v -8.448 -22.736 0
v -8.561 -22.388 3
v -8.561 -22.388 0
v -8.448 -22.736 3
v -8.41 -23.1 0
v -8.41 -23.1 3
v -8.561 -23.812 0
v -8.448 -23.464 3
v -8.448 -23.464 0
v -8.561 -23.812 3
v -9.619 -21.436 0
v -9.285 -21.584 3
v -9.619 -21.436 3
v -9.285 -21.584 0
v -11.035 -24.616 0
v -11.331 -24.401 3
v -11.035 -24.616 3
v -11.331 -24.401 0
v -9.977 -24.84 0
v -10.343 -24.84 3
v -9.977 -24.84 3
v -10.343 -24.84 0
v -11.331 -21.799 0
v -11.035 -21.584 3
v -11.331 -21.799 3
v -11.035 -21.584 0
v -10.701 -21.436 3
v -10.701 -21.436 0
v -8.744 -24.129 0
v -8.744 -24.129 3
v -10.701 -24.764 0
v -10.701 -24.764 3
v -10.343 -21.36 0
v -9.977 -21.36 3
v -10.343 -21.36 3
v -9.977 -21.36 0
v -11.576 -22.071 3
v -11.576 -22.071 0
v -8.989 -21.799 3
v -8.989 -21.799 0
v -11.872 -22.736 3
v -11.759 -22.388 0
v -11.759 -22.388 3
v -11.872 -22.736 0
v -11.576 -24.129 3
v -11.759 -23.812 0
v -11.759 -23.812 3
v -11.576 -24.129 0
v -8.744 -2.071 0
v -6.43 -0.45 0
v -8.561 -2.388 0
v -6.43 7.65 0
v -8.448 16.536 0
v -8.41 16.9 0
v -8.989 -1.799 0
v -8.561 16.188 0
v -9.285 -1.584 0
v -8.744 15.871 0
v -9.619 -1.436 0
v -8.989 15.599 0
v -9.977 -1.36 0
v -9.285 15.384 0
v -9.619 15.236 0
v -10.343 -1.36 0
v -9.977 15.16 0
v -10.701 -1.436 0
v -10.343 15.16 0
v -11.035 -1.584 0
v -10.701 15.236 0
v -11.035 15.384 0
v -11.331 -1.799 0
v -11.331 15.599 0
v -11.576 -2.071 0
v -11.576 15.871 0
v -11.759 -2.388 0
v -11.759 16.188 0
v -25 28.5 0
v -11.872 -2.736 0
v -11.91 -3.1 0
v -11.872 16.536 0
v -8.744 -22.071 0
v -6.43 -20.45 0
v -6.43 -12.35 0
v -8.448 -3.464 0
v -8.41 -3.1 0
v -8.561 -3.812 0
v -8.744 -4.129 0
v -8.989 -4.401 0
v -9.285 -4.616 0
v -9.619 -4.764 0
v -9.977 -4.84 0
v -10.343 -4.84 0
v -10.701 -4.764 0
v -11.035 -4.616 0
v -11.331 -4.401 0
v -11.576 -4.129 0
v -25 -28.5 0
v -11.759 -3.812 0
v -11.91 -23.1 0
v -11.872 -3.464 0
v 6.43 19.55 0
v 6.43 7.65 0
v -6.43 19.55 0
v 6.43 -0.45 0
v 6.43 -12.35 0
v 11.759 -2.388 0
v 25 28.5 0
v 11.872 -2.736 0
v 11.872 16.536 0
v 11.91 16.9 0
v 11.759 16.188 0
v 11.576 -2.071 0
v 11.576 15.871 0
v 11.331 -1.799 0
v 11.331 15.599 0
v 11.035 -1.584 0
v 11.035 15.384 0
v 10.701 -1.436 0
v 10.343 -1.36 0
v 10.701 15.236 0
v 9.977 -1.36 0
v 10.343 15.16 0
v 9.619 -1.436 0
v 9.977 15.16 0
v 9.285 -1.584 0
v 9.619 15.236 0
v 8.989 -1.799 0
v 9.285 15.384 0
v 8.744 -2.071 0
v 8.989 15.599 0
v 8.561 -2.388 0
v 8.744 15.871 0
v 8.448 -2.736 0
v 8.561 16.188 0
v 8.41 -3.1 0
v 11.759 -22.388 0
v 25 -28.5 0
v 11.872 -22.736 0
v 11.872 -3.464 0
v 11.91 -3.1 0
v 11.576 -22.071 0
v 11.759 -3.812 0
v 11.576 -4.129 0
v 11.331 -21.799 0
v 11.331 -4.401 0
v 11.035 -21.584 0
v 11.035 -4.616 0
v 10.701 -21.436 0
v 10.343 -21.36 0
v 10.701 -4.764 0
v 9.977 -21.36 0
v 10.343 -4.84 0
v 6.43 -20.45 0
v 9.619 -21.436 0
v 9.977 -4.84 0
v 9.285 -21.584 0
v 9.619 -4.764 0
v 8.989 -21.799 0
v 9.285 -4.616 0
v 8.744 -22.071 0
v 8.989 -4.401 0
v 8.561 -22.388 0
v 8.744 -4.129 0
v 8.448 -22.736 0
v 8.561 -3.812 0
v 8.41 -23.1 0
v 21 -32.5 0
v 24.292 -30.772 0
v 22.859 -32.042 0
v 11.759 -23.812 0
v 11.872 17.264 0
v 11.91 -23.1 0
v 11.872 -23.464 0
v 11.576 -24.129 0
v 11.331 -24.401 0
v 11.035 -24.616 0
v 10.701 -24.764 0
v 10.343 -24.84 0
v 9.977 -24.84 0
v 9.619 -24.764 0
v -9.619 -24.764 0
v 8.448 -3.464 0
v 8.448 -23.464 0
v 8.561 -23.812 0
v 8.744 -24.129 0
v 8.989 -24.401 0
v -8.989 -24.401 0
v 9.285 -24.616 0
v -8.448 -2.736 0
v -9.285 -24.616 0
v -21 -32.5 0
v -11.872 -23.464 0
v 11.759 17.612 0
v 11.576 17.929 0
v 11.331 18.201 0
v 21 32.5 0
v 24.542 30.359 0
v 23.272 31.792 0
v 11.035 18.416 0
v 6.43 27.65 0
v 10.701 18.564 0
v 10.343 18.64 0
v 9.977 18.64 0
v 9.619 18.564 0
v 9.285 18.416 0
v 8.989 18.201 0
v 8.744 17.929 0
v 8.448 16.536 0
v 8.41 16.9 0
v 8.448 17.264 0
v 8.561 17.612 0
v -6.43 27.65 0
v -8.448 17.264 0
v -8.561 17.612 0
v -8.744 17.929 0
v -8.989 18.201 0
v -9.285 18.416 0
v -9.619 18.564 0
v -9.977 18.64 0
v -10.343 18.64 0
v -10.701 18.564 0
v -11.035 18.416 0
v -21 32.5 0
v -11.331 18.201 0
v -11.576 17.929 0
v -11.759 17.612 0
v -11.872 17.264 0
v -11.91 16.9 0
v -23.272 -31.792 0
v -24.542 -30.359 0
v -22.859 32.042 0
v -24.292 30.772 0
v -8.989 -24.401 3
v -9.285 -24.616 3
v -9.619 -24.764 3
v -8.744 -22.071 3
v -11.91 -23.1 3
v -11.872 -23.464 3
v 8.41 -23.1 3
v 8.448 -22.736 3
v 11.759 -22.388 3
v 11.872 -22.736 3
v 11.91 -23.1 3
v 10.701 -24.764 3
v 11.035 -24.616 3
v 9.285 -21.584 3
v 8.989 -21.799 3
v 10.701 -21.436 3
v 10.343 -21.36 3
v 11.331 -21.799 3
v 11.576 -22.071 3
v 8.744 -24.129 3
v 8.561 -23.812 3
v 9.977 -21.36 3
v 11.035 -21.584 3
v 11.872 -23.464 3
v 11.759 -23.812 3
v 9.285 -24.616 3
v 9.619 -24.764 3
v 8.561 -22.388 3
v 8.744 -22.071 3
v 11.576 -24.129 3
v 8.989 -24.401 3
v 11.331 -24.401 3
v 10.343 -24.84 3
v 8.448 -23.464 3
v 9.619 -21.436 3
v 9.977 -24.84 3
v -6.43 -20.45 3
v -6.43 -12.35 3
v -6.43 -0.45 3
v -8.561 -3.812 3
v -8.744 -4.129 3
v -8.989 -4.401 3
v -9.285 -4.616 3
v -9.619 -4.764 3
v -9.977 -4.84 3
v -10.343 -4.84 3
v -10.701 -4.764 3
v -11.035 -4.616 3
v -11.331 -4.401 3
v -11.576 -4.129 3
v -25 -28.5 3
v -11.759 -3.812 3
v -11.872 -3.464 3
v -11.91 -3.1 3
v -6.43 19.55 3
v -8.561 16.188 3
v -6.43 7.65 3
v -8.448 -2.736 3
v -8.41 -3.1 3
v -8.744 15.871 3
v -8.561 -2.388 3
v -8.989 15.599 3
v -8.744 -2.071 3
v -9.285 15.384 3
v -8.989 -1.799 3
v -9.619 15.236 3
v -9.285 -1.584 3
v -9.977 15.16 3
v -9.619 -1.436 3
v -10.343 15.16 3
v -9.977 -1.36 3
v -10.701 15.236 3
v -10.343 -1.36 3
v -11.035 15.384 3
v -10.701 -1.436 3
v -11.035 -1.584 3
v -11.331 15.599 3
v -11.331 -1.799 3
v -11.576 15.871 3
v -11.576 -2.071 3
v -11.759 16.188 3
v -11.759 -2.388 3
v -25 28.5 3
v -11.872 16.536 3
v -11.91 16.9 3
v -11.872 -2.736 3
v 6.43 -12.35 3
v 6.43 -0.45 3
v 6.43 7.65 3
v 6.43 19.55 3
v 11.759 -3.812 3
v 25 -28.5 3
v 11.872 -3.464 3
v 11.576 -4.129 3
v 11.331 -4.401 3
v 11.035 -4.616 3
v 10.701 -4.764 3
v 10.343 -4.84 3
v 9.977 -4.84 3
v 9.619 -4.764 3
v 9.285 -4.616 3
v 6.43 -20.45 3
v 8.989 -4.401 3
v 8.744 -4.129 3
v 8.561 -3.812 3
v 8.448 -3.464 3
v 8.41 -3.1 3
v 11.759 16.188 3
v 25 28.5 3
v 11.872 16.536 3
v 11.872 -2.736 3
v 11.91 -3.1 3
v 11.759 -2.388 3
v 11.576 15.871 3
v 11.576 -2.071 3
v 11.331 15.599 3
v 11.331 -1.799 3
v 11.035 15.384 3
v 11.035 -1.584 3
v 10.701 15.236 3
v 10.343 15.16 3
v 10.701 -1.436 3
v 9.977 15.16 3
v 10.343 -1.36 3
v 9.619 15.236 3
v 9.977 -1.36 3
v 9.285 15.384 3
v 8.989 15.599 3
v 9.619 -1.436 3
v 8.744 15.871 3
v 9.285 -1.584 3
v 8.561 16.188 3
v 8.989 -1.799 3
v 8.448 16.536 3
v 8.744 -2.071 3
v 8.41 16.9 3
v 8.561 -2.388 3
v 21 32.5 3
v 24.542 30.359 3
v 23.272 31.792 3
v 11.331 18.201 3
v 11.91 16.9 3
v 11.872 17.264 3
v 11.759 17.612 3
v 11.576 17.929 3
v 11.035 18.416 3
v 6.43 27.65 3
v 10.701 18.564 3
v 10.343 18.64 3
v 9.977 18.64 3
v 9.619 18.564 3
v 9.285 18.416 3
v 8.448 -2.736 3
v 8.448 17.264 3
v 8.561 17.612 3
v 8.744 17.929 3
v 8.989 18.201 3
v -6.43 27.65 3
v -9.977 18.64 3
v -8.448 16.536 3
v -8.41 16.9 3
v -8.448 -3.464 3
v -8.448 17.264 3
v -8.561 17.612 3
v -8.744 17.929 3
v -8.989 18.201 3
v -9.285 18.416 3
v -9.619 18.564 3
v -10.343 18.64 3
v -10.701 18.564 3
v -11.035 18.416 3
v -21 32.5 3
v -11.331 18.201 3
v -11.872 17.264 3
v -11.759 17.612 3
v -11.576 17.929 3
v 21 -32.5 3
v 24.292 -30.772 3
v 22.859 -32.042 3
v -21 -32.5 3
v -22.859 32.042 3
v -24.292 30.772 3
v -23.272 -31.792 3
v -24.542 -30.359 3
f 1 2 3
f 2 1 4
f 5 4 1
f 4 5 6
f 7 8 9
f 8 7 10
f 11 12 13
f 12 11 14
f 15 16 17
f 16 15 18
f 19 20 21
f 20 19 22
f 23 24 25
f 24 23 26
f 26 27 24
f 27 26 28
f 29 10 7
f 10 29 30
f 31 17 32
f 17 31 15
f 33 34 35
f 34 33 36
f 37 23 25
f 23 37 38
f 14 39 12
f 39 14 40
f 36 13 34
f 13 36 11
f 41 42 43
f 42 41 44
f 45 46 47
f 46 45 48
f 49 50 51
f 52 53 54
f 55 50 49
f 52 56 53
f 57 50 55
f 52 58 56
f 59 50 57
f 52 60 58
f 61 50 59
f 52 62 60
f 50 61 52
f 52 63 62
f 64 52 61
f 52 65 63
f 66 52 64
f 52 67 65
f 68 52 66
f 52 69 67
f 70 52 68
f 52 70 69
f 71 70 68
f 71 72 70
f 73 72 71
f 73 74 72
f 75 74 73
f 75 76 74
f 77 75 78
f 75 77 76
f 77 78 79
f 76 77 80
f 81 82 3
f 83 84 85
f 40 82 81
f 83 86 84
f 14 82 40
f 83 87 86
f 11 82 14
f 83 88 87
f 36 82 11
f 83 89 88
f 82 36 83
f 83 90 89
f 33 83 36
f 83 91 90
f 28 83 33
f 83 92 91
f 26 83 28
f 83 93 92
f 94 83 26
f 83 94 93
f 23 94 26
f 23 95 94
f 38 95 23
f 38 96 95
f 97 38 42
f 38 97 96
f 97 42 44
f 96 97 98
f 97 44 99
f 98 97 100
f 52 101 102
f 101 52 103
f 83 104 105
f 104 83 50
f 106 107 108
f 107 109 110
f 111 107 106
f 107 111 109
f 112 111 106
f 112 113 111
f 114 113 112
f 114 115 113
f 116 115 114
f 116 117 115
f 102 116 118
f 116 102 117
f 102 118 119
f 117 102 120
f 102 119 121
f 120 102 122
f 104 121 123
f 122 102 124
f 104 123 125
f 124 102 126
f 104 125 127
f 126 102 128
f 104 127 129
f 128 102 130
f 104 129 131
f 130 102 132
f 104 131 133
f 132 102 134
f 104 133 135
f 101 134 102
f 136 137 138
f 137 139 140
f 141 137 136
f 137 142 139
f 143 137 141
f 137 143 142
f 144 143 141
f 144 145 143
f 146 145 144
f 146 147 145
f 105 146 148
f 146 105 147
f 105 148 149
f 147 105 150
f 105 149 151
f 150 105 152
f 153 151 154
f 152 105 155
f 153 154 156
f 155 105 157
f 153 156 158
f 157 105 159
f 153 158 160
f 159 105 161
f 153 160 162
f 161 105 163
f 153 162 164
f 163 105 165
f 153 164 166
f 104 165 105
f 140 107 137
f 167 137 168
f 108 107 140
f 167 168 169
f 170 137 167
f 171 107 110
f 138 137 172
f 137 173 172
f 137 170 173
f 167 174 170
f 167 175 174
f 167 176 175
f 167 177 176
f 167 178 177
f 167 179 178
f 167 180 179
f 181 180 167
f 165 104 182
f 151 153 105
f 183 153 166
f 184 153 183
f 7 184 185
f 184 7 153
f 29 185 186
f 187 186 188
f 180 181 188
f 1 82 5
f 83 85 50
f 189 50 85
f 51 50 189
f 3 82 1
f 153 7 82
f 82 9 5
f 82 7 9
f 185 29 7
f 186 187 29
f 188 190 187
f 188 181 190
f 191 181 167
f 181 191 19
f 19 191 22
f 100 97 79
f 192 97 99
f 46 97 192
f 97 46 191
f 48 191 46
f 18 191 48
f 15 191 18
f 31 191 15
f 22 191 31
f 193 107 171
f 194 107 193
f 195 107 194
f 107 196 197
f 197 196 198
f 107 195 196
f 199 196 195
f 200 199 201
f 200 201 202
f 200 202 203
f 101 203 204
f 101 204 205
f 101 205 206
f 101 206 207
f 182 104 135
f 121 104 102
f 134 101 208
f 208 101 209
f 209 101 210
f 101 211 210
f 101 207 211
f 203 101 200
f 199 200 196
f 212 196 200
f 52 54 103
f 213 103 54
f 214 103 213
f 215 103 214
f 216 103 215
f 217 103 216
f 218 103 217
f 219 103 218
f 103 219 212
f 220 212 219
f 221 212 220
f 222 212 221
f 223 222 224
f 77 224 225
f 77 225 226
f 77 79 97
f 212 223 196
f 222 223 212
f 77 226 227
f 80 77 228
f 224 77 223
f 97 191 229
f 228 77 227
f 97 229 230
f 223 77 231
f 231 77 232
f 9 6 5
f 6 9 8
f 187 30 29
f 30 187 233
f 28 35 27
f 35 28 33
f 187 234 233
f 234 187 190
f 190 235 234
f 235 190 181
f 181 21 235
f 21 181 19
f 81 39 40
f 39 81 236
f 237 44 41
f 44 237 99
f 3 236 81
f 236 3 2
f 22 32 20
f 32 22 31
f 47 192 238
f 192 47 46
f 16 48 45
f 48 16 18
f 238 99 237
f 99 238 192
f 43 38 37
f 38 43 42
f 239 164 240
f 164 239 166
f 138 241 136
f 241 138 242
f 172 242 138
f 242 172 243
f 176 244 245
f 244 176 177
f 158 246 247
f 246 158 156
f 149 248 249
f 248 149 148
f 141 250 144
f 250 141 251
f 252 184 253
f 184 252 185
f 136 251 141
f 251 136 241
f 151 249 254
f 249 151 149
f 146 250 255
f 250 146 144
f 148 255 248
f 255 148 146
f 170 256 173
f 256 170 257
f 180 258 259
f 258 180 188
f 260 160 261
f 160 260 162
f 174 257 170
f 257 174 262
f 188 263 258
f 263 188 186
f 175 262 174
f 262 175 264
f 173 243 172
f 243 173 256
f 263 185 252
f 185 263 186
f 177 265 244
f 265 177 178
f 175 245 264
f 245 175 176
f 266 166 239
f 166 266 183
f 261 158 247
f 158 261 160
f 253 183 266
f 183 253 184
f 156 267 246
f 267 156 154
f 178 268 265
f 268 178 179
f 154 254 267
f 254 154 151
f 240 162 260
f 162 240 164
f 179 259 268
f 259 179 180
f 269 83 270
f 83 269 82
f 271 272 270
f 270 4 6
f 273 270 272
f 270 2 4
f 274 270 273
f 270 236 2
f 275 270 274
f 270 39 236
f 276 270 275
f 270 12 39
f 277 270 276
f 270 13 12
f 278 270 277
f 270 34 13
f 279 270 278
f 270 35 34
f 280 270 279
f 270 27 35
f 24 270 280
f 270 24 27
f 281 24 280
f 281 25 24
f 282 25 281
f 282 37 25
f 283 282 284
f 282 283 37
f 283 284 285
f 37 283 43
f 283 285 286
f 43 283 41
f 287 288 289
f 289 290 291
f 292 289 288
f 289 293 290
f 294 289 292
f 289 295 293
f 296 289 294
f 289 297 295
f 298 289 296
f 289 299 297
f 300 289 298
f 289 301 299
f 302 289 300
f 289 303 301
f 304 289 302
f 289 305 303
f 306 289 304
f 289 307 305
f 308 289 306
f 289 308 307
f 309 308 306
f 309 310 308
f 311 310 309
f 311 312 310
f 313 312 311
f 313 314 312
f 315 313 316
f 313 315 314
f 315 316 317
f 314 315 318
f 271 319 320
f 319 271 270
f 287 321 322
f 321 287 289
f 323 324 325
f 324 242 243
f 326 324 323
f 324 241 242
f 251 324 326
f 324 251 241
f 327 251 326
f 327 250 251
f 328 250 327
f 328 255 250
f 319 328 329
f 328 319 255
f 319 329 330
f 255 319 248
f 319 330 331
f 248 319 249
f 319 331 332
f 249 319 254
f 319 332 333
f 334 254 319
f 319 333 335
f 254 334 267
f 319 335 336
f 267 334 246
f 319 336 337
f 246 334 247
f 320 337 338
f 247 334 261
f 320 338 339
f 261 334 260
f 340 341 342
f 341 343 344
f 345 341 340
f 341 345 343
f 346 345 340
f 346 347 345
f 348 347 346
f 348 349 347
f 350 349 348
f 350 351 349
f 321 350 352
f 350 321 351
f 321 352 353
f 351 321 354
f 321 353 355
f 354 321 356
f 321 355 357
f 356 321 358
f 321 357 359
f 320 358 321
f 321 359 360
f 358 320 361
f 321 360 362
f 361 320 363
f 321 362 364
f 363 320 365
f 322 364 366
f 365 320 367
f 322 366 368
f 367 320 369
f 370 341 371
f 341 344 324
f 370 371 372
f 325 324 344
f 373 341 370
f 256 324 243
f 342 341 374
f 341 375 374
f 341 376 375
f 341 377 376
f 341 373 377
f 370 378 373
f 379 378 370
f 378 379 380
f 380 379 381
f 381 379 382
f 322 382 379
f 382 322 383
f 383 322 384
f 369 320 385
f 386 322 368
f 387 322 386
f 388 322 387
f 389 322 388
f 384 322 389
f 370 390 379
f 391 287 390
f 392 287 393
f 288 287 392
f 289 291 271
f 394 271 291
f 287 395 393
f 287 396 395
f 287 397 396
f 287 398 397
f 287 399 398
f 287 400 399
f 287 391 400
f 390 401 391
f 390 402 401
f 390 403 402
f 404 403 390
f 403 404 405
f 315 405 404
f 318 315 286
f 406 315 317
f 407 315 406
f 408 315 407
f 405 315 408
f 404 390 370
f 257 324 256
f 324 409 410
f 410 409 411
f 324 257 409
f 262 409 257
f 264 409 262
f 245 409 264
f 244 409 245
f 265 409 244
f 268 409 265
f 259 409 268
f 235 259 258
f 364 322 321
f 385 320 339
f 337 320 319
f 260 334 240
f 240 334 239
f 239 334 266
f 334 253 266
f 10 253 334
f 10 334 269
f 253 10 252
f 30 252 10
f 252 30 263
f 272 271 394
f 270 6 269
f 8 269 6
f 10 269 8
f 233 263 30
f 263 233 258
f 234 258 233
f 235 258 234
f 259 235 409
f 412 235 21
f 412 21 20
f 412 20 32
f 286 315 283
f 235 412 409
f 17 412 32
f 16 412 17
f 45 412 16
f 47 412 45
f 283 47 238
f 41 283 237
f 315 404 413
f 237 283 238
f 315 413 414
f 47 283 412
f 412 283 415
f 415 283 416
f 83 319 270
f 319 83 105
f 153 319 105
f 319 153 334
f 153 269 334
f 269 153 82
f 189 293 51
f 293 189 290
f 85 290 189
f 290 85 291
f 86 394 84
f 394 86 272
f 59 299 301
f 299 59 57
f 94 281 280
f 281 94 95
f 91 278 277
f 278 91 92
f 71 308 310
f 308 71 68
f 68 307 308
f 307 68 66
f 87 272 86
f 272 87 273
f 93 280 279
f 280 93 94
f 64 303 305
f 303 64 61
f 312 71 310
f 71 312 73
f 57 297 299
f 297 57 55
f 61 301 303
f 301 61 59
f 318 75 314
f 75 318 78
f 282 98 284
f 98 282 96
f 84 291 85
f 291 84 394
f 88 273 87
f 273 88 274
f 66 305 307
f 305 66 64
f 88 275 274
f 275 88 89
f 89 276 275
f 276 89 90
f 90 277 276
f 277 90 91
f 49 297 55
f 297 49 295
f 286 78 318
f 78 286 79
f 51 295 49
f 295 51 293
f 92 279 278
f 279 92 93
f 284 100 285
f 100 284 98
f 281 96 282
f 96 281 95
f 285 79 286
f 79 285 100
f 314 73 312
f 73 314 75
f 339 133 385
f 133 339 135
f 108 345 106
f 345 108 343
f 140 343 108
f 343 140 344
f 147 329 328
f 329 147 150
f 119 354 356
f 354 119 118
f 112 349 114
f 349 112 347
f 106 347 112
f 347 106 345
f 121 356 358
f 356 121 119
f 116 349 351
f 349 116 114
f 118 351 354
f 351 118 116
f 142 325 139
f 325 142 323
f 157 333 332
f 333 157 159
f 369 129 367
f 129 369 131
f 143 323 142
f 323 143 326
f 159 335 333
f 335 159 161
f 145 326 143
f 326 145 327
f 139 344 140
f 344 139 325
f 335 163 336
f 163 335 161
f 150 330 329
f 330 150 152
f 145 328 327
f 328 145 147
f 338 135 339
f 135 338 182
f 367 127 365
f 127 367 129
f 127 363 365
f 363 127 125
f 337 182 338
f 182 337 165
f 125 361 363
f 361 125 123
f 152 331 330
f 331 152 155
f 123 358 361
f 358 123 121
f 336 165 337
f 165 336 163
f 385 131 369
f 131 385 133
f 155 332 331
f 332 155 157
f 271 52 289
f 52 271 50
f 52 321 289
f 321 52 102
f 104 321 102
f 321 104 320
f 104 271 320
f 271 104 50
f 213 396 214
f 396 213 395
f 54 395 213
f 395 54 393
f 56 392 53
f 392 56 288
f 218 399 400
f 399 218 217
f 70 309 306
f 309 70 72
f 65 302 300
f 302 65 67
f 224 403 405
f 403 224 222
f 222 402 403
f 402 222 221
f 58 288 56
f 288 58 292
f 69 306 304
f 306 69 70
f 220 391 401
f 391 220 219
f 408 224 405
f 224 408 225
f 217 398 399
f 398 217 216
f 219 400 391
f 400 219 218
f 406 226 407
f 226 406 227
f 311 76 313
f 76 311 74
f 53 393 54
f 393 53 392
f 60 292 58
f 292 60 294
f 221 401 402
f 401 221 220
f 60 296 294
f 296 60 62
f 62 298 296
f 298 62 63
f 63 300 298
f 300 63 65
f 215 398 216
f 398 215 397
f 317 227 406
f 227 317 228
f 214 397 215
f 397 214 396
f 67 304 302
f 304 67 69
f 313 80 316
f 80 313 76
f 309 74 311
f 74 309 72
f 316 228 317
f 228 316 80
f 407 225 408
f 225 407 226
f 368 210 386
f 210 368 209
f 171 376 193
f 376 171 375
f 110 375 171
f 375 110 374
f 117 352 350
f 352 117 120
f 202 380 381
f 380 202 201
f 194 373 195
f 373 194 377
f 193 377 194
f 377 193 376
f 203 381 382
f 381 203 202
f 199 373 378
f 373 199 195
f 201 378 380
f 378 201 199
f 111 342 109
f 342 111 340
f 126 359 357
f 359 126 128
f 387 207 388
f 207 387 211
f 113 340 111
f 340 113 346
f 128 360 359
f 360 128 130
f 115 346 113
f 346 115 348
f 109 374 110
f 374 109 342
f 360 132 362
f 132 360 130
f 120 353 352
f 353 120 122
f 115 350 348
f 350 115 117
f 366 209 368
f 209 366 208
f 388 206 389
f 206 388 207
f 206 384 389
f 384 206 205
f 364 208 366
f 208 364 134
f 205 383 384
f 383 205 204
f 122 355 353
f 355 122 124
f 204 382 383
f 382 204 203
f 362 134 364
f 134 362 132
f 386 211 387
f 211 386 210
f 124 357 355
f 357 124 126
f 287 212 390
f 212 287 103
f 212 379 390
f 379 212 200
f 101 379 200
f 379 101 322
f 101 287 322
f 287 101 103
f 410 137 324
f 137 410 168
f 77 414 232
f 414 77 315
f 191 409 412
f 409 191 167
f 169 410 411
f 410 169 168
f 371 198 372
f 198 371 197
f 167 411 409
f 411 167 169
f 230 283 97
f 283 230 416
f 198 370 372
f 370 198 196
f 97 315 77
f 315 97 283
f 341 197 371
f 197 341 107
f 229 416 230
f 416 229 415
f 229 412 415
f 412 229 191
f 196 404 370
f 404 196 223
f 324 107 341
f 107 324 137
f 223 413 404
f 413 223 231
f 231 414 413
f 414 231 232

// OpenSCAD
// Main box
BOX_W = 50;      // width  (X)
BOX_L = 65;     // length (Y)
BOX_H = 3;    
BOX_R = 4;
HOLE_PADDING = 6;
HOLE_DIAM = 4.5;
HOLE_FN = 30;
PIN_DIST = 5.08;

CONNECTOR_PINS = 2;


// Main plate with rounded corners
difference(){
    linear_extrude(BOX_H)
        offset(r = BOX_R) 
            offset(r = -BOX_R) 
                square([BOX_W, BOX_L], center = true);
                
             
   // mounting_holes(BOX_W,HOLE_PADDING);
    ROW1 = 5;
    ROW2 = -15;
    for ( i = [-23:20:40]) 
        connector(0,i,CONNECTOR_PINS);
    

    
}

module connector(posX,posY,pins){
    connector_holes(posX,posY,pins);
    connector_body(posX,posY,pins);
}




module connector_holes(xPos,yPos,pins){
    X = xPos;
    Y = yPos;
    //holes_dist = PIN_DIST * (pins-1)+10+0.2;
    holes_dist = PIN_DIST * (pins+2);
    
    translate( [X - holes_dist/2, Y -0.1] )
        hole_M3();

    translate( [X + holes_dist/2, Y -0.1] )
        hole_M3();
}



module connector_body(xPos, yPos,pins) {
    body_w = pins * 5.08 + 2.7;   // total width of the plastic body
    body_l = 8.1;             // depth of the body (Y direction)
    
    y = yPos + 2.55 + body_l/2;
    
    translate([xPos, y, 0])
        linear_extrude(BOX_H)
            translate([-body_w/2, -body_l/2, -0.1])
                square([body_w, body_l]);
}



module mounting_holes(w,padding){
    // Right side
    translate([ w/2 - padding,  0, -0.1]) 
    hole_M3();
    
    translate([ w/2 - padding,  25/2, -0.1]) 
    hole_M3();

    translate([ w/2 - padding, 0- 25/2, -0.1]) 
    hole_M3();

    // Left side holes
    translate([ 0- w/2 + padding,  0, -0.1]) 
    hole_M3();
    
    translate([0- w/2 + padding,  25/2, -0.1]) 
    hole_M3();

    translate([0- w/2 + padding, 0- 25/2, -0.1]) 
    hole_M3();

    
}


module hole_M2(){
    cylinder(h = BOX_H + 0.2, d = 2, $fn=15);
}


module hole_M3(){
    cylinder(h = BOX_H + 0.2, d = 3.5, $fn=HOLE_FN);
}
